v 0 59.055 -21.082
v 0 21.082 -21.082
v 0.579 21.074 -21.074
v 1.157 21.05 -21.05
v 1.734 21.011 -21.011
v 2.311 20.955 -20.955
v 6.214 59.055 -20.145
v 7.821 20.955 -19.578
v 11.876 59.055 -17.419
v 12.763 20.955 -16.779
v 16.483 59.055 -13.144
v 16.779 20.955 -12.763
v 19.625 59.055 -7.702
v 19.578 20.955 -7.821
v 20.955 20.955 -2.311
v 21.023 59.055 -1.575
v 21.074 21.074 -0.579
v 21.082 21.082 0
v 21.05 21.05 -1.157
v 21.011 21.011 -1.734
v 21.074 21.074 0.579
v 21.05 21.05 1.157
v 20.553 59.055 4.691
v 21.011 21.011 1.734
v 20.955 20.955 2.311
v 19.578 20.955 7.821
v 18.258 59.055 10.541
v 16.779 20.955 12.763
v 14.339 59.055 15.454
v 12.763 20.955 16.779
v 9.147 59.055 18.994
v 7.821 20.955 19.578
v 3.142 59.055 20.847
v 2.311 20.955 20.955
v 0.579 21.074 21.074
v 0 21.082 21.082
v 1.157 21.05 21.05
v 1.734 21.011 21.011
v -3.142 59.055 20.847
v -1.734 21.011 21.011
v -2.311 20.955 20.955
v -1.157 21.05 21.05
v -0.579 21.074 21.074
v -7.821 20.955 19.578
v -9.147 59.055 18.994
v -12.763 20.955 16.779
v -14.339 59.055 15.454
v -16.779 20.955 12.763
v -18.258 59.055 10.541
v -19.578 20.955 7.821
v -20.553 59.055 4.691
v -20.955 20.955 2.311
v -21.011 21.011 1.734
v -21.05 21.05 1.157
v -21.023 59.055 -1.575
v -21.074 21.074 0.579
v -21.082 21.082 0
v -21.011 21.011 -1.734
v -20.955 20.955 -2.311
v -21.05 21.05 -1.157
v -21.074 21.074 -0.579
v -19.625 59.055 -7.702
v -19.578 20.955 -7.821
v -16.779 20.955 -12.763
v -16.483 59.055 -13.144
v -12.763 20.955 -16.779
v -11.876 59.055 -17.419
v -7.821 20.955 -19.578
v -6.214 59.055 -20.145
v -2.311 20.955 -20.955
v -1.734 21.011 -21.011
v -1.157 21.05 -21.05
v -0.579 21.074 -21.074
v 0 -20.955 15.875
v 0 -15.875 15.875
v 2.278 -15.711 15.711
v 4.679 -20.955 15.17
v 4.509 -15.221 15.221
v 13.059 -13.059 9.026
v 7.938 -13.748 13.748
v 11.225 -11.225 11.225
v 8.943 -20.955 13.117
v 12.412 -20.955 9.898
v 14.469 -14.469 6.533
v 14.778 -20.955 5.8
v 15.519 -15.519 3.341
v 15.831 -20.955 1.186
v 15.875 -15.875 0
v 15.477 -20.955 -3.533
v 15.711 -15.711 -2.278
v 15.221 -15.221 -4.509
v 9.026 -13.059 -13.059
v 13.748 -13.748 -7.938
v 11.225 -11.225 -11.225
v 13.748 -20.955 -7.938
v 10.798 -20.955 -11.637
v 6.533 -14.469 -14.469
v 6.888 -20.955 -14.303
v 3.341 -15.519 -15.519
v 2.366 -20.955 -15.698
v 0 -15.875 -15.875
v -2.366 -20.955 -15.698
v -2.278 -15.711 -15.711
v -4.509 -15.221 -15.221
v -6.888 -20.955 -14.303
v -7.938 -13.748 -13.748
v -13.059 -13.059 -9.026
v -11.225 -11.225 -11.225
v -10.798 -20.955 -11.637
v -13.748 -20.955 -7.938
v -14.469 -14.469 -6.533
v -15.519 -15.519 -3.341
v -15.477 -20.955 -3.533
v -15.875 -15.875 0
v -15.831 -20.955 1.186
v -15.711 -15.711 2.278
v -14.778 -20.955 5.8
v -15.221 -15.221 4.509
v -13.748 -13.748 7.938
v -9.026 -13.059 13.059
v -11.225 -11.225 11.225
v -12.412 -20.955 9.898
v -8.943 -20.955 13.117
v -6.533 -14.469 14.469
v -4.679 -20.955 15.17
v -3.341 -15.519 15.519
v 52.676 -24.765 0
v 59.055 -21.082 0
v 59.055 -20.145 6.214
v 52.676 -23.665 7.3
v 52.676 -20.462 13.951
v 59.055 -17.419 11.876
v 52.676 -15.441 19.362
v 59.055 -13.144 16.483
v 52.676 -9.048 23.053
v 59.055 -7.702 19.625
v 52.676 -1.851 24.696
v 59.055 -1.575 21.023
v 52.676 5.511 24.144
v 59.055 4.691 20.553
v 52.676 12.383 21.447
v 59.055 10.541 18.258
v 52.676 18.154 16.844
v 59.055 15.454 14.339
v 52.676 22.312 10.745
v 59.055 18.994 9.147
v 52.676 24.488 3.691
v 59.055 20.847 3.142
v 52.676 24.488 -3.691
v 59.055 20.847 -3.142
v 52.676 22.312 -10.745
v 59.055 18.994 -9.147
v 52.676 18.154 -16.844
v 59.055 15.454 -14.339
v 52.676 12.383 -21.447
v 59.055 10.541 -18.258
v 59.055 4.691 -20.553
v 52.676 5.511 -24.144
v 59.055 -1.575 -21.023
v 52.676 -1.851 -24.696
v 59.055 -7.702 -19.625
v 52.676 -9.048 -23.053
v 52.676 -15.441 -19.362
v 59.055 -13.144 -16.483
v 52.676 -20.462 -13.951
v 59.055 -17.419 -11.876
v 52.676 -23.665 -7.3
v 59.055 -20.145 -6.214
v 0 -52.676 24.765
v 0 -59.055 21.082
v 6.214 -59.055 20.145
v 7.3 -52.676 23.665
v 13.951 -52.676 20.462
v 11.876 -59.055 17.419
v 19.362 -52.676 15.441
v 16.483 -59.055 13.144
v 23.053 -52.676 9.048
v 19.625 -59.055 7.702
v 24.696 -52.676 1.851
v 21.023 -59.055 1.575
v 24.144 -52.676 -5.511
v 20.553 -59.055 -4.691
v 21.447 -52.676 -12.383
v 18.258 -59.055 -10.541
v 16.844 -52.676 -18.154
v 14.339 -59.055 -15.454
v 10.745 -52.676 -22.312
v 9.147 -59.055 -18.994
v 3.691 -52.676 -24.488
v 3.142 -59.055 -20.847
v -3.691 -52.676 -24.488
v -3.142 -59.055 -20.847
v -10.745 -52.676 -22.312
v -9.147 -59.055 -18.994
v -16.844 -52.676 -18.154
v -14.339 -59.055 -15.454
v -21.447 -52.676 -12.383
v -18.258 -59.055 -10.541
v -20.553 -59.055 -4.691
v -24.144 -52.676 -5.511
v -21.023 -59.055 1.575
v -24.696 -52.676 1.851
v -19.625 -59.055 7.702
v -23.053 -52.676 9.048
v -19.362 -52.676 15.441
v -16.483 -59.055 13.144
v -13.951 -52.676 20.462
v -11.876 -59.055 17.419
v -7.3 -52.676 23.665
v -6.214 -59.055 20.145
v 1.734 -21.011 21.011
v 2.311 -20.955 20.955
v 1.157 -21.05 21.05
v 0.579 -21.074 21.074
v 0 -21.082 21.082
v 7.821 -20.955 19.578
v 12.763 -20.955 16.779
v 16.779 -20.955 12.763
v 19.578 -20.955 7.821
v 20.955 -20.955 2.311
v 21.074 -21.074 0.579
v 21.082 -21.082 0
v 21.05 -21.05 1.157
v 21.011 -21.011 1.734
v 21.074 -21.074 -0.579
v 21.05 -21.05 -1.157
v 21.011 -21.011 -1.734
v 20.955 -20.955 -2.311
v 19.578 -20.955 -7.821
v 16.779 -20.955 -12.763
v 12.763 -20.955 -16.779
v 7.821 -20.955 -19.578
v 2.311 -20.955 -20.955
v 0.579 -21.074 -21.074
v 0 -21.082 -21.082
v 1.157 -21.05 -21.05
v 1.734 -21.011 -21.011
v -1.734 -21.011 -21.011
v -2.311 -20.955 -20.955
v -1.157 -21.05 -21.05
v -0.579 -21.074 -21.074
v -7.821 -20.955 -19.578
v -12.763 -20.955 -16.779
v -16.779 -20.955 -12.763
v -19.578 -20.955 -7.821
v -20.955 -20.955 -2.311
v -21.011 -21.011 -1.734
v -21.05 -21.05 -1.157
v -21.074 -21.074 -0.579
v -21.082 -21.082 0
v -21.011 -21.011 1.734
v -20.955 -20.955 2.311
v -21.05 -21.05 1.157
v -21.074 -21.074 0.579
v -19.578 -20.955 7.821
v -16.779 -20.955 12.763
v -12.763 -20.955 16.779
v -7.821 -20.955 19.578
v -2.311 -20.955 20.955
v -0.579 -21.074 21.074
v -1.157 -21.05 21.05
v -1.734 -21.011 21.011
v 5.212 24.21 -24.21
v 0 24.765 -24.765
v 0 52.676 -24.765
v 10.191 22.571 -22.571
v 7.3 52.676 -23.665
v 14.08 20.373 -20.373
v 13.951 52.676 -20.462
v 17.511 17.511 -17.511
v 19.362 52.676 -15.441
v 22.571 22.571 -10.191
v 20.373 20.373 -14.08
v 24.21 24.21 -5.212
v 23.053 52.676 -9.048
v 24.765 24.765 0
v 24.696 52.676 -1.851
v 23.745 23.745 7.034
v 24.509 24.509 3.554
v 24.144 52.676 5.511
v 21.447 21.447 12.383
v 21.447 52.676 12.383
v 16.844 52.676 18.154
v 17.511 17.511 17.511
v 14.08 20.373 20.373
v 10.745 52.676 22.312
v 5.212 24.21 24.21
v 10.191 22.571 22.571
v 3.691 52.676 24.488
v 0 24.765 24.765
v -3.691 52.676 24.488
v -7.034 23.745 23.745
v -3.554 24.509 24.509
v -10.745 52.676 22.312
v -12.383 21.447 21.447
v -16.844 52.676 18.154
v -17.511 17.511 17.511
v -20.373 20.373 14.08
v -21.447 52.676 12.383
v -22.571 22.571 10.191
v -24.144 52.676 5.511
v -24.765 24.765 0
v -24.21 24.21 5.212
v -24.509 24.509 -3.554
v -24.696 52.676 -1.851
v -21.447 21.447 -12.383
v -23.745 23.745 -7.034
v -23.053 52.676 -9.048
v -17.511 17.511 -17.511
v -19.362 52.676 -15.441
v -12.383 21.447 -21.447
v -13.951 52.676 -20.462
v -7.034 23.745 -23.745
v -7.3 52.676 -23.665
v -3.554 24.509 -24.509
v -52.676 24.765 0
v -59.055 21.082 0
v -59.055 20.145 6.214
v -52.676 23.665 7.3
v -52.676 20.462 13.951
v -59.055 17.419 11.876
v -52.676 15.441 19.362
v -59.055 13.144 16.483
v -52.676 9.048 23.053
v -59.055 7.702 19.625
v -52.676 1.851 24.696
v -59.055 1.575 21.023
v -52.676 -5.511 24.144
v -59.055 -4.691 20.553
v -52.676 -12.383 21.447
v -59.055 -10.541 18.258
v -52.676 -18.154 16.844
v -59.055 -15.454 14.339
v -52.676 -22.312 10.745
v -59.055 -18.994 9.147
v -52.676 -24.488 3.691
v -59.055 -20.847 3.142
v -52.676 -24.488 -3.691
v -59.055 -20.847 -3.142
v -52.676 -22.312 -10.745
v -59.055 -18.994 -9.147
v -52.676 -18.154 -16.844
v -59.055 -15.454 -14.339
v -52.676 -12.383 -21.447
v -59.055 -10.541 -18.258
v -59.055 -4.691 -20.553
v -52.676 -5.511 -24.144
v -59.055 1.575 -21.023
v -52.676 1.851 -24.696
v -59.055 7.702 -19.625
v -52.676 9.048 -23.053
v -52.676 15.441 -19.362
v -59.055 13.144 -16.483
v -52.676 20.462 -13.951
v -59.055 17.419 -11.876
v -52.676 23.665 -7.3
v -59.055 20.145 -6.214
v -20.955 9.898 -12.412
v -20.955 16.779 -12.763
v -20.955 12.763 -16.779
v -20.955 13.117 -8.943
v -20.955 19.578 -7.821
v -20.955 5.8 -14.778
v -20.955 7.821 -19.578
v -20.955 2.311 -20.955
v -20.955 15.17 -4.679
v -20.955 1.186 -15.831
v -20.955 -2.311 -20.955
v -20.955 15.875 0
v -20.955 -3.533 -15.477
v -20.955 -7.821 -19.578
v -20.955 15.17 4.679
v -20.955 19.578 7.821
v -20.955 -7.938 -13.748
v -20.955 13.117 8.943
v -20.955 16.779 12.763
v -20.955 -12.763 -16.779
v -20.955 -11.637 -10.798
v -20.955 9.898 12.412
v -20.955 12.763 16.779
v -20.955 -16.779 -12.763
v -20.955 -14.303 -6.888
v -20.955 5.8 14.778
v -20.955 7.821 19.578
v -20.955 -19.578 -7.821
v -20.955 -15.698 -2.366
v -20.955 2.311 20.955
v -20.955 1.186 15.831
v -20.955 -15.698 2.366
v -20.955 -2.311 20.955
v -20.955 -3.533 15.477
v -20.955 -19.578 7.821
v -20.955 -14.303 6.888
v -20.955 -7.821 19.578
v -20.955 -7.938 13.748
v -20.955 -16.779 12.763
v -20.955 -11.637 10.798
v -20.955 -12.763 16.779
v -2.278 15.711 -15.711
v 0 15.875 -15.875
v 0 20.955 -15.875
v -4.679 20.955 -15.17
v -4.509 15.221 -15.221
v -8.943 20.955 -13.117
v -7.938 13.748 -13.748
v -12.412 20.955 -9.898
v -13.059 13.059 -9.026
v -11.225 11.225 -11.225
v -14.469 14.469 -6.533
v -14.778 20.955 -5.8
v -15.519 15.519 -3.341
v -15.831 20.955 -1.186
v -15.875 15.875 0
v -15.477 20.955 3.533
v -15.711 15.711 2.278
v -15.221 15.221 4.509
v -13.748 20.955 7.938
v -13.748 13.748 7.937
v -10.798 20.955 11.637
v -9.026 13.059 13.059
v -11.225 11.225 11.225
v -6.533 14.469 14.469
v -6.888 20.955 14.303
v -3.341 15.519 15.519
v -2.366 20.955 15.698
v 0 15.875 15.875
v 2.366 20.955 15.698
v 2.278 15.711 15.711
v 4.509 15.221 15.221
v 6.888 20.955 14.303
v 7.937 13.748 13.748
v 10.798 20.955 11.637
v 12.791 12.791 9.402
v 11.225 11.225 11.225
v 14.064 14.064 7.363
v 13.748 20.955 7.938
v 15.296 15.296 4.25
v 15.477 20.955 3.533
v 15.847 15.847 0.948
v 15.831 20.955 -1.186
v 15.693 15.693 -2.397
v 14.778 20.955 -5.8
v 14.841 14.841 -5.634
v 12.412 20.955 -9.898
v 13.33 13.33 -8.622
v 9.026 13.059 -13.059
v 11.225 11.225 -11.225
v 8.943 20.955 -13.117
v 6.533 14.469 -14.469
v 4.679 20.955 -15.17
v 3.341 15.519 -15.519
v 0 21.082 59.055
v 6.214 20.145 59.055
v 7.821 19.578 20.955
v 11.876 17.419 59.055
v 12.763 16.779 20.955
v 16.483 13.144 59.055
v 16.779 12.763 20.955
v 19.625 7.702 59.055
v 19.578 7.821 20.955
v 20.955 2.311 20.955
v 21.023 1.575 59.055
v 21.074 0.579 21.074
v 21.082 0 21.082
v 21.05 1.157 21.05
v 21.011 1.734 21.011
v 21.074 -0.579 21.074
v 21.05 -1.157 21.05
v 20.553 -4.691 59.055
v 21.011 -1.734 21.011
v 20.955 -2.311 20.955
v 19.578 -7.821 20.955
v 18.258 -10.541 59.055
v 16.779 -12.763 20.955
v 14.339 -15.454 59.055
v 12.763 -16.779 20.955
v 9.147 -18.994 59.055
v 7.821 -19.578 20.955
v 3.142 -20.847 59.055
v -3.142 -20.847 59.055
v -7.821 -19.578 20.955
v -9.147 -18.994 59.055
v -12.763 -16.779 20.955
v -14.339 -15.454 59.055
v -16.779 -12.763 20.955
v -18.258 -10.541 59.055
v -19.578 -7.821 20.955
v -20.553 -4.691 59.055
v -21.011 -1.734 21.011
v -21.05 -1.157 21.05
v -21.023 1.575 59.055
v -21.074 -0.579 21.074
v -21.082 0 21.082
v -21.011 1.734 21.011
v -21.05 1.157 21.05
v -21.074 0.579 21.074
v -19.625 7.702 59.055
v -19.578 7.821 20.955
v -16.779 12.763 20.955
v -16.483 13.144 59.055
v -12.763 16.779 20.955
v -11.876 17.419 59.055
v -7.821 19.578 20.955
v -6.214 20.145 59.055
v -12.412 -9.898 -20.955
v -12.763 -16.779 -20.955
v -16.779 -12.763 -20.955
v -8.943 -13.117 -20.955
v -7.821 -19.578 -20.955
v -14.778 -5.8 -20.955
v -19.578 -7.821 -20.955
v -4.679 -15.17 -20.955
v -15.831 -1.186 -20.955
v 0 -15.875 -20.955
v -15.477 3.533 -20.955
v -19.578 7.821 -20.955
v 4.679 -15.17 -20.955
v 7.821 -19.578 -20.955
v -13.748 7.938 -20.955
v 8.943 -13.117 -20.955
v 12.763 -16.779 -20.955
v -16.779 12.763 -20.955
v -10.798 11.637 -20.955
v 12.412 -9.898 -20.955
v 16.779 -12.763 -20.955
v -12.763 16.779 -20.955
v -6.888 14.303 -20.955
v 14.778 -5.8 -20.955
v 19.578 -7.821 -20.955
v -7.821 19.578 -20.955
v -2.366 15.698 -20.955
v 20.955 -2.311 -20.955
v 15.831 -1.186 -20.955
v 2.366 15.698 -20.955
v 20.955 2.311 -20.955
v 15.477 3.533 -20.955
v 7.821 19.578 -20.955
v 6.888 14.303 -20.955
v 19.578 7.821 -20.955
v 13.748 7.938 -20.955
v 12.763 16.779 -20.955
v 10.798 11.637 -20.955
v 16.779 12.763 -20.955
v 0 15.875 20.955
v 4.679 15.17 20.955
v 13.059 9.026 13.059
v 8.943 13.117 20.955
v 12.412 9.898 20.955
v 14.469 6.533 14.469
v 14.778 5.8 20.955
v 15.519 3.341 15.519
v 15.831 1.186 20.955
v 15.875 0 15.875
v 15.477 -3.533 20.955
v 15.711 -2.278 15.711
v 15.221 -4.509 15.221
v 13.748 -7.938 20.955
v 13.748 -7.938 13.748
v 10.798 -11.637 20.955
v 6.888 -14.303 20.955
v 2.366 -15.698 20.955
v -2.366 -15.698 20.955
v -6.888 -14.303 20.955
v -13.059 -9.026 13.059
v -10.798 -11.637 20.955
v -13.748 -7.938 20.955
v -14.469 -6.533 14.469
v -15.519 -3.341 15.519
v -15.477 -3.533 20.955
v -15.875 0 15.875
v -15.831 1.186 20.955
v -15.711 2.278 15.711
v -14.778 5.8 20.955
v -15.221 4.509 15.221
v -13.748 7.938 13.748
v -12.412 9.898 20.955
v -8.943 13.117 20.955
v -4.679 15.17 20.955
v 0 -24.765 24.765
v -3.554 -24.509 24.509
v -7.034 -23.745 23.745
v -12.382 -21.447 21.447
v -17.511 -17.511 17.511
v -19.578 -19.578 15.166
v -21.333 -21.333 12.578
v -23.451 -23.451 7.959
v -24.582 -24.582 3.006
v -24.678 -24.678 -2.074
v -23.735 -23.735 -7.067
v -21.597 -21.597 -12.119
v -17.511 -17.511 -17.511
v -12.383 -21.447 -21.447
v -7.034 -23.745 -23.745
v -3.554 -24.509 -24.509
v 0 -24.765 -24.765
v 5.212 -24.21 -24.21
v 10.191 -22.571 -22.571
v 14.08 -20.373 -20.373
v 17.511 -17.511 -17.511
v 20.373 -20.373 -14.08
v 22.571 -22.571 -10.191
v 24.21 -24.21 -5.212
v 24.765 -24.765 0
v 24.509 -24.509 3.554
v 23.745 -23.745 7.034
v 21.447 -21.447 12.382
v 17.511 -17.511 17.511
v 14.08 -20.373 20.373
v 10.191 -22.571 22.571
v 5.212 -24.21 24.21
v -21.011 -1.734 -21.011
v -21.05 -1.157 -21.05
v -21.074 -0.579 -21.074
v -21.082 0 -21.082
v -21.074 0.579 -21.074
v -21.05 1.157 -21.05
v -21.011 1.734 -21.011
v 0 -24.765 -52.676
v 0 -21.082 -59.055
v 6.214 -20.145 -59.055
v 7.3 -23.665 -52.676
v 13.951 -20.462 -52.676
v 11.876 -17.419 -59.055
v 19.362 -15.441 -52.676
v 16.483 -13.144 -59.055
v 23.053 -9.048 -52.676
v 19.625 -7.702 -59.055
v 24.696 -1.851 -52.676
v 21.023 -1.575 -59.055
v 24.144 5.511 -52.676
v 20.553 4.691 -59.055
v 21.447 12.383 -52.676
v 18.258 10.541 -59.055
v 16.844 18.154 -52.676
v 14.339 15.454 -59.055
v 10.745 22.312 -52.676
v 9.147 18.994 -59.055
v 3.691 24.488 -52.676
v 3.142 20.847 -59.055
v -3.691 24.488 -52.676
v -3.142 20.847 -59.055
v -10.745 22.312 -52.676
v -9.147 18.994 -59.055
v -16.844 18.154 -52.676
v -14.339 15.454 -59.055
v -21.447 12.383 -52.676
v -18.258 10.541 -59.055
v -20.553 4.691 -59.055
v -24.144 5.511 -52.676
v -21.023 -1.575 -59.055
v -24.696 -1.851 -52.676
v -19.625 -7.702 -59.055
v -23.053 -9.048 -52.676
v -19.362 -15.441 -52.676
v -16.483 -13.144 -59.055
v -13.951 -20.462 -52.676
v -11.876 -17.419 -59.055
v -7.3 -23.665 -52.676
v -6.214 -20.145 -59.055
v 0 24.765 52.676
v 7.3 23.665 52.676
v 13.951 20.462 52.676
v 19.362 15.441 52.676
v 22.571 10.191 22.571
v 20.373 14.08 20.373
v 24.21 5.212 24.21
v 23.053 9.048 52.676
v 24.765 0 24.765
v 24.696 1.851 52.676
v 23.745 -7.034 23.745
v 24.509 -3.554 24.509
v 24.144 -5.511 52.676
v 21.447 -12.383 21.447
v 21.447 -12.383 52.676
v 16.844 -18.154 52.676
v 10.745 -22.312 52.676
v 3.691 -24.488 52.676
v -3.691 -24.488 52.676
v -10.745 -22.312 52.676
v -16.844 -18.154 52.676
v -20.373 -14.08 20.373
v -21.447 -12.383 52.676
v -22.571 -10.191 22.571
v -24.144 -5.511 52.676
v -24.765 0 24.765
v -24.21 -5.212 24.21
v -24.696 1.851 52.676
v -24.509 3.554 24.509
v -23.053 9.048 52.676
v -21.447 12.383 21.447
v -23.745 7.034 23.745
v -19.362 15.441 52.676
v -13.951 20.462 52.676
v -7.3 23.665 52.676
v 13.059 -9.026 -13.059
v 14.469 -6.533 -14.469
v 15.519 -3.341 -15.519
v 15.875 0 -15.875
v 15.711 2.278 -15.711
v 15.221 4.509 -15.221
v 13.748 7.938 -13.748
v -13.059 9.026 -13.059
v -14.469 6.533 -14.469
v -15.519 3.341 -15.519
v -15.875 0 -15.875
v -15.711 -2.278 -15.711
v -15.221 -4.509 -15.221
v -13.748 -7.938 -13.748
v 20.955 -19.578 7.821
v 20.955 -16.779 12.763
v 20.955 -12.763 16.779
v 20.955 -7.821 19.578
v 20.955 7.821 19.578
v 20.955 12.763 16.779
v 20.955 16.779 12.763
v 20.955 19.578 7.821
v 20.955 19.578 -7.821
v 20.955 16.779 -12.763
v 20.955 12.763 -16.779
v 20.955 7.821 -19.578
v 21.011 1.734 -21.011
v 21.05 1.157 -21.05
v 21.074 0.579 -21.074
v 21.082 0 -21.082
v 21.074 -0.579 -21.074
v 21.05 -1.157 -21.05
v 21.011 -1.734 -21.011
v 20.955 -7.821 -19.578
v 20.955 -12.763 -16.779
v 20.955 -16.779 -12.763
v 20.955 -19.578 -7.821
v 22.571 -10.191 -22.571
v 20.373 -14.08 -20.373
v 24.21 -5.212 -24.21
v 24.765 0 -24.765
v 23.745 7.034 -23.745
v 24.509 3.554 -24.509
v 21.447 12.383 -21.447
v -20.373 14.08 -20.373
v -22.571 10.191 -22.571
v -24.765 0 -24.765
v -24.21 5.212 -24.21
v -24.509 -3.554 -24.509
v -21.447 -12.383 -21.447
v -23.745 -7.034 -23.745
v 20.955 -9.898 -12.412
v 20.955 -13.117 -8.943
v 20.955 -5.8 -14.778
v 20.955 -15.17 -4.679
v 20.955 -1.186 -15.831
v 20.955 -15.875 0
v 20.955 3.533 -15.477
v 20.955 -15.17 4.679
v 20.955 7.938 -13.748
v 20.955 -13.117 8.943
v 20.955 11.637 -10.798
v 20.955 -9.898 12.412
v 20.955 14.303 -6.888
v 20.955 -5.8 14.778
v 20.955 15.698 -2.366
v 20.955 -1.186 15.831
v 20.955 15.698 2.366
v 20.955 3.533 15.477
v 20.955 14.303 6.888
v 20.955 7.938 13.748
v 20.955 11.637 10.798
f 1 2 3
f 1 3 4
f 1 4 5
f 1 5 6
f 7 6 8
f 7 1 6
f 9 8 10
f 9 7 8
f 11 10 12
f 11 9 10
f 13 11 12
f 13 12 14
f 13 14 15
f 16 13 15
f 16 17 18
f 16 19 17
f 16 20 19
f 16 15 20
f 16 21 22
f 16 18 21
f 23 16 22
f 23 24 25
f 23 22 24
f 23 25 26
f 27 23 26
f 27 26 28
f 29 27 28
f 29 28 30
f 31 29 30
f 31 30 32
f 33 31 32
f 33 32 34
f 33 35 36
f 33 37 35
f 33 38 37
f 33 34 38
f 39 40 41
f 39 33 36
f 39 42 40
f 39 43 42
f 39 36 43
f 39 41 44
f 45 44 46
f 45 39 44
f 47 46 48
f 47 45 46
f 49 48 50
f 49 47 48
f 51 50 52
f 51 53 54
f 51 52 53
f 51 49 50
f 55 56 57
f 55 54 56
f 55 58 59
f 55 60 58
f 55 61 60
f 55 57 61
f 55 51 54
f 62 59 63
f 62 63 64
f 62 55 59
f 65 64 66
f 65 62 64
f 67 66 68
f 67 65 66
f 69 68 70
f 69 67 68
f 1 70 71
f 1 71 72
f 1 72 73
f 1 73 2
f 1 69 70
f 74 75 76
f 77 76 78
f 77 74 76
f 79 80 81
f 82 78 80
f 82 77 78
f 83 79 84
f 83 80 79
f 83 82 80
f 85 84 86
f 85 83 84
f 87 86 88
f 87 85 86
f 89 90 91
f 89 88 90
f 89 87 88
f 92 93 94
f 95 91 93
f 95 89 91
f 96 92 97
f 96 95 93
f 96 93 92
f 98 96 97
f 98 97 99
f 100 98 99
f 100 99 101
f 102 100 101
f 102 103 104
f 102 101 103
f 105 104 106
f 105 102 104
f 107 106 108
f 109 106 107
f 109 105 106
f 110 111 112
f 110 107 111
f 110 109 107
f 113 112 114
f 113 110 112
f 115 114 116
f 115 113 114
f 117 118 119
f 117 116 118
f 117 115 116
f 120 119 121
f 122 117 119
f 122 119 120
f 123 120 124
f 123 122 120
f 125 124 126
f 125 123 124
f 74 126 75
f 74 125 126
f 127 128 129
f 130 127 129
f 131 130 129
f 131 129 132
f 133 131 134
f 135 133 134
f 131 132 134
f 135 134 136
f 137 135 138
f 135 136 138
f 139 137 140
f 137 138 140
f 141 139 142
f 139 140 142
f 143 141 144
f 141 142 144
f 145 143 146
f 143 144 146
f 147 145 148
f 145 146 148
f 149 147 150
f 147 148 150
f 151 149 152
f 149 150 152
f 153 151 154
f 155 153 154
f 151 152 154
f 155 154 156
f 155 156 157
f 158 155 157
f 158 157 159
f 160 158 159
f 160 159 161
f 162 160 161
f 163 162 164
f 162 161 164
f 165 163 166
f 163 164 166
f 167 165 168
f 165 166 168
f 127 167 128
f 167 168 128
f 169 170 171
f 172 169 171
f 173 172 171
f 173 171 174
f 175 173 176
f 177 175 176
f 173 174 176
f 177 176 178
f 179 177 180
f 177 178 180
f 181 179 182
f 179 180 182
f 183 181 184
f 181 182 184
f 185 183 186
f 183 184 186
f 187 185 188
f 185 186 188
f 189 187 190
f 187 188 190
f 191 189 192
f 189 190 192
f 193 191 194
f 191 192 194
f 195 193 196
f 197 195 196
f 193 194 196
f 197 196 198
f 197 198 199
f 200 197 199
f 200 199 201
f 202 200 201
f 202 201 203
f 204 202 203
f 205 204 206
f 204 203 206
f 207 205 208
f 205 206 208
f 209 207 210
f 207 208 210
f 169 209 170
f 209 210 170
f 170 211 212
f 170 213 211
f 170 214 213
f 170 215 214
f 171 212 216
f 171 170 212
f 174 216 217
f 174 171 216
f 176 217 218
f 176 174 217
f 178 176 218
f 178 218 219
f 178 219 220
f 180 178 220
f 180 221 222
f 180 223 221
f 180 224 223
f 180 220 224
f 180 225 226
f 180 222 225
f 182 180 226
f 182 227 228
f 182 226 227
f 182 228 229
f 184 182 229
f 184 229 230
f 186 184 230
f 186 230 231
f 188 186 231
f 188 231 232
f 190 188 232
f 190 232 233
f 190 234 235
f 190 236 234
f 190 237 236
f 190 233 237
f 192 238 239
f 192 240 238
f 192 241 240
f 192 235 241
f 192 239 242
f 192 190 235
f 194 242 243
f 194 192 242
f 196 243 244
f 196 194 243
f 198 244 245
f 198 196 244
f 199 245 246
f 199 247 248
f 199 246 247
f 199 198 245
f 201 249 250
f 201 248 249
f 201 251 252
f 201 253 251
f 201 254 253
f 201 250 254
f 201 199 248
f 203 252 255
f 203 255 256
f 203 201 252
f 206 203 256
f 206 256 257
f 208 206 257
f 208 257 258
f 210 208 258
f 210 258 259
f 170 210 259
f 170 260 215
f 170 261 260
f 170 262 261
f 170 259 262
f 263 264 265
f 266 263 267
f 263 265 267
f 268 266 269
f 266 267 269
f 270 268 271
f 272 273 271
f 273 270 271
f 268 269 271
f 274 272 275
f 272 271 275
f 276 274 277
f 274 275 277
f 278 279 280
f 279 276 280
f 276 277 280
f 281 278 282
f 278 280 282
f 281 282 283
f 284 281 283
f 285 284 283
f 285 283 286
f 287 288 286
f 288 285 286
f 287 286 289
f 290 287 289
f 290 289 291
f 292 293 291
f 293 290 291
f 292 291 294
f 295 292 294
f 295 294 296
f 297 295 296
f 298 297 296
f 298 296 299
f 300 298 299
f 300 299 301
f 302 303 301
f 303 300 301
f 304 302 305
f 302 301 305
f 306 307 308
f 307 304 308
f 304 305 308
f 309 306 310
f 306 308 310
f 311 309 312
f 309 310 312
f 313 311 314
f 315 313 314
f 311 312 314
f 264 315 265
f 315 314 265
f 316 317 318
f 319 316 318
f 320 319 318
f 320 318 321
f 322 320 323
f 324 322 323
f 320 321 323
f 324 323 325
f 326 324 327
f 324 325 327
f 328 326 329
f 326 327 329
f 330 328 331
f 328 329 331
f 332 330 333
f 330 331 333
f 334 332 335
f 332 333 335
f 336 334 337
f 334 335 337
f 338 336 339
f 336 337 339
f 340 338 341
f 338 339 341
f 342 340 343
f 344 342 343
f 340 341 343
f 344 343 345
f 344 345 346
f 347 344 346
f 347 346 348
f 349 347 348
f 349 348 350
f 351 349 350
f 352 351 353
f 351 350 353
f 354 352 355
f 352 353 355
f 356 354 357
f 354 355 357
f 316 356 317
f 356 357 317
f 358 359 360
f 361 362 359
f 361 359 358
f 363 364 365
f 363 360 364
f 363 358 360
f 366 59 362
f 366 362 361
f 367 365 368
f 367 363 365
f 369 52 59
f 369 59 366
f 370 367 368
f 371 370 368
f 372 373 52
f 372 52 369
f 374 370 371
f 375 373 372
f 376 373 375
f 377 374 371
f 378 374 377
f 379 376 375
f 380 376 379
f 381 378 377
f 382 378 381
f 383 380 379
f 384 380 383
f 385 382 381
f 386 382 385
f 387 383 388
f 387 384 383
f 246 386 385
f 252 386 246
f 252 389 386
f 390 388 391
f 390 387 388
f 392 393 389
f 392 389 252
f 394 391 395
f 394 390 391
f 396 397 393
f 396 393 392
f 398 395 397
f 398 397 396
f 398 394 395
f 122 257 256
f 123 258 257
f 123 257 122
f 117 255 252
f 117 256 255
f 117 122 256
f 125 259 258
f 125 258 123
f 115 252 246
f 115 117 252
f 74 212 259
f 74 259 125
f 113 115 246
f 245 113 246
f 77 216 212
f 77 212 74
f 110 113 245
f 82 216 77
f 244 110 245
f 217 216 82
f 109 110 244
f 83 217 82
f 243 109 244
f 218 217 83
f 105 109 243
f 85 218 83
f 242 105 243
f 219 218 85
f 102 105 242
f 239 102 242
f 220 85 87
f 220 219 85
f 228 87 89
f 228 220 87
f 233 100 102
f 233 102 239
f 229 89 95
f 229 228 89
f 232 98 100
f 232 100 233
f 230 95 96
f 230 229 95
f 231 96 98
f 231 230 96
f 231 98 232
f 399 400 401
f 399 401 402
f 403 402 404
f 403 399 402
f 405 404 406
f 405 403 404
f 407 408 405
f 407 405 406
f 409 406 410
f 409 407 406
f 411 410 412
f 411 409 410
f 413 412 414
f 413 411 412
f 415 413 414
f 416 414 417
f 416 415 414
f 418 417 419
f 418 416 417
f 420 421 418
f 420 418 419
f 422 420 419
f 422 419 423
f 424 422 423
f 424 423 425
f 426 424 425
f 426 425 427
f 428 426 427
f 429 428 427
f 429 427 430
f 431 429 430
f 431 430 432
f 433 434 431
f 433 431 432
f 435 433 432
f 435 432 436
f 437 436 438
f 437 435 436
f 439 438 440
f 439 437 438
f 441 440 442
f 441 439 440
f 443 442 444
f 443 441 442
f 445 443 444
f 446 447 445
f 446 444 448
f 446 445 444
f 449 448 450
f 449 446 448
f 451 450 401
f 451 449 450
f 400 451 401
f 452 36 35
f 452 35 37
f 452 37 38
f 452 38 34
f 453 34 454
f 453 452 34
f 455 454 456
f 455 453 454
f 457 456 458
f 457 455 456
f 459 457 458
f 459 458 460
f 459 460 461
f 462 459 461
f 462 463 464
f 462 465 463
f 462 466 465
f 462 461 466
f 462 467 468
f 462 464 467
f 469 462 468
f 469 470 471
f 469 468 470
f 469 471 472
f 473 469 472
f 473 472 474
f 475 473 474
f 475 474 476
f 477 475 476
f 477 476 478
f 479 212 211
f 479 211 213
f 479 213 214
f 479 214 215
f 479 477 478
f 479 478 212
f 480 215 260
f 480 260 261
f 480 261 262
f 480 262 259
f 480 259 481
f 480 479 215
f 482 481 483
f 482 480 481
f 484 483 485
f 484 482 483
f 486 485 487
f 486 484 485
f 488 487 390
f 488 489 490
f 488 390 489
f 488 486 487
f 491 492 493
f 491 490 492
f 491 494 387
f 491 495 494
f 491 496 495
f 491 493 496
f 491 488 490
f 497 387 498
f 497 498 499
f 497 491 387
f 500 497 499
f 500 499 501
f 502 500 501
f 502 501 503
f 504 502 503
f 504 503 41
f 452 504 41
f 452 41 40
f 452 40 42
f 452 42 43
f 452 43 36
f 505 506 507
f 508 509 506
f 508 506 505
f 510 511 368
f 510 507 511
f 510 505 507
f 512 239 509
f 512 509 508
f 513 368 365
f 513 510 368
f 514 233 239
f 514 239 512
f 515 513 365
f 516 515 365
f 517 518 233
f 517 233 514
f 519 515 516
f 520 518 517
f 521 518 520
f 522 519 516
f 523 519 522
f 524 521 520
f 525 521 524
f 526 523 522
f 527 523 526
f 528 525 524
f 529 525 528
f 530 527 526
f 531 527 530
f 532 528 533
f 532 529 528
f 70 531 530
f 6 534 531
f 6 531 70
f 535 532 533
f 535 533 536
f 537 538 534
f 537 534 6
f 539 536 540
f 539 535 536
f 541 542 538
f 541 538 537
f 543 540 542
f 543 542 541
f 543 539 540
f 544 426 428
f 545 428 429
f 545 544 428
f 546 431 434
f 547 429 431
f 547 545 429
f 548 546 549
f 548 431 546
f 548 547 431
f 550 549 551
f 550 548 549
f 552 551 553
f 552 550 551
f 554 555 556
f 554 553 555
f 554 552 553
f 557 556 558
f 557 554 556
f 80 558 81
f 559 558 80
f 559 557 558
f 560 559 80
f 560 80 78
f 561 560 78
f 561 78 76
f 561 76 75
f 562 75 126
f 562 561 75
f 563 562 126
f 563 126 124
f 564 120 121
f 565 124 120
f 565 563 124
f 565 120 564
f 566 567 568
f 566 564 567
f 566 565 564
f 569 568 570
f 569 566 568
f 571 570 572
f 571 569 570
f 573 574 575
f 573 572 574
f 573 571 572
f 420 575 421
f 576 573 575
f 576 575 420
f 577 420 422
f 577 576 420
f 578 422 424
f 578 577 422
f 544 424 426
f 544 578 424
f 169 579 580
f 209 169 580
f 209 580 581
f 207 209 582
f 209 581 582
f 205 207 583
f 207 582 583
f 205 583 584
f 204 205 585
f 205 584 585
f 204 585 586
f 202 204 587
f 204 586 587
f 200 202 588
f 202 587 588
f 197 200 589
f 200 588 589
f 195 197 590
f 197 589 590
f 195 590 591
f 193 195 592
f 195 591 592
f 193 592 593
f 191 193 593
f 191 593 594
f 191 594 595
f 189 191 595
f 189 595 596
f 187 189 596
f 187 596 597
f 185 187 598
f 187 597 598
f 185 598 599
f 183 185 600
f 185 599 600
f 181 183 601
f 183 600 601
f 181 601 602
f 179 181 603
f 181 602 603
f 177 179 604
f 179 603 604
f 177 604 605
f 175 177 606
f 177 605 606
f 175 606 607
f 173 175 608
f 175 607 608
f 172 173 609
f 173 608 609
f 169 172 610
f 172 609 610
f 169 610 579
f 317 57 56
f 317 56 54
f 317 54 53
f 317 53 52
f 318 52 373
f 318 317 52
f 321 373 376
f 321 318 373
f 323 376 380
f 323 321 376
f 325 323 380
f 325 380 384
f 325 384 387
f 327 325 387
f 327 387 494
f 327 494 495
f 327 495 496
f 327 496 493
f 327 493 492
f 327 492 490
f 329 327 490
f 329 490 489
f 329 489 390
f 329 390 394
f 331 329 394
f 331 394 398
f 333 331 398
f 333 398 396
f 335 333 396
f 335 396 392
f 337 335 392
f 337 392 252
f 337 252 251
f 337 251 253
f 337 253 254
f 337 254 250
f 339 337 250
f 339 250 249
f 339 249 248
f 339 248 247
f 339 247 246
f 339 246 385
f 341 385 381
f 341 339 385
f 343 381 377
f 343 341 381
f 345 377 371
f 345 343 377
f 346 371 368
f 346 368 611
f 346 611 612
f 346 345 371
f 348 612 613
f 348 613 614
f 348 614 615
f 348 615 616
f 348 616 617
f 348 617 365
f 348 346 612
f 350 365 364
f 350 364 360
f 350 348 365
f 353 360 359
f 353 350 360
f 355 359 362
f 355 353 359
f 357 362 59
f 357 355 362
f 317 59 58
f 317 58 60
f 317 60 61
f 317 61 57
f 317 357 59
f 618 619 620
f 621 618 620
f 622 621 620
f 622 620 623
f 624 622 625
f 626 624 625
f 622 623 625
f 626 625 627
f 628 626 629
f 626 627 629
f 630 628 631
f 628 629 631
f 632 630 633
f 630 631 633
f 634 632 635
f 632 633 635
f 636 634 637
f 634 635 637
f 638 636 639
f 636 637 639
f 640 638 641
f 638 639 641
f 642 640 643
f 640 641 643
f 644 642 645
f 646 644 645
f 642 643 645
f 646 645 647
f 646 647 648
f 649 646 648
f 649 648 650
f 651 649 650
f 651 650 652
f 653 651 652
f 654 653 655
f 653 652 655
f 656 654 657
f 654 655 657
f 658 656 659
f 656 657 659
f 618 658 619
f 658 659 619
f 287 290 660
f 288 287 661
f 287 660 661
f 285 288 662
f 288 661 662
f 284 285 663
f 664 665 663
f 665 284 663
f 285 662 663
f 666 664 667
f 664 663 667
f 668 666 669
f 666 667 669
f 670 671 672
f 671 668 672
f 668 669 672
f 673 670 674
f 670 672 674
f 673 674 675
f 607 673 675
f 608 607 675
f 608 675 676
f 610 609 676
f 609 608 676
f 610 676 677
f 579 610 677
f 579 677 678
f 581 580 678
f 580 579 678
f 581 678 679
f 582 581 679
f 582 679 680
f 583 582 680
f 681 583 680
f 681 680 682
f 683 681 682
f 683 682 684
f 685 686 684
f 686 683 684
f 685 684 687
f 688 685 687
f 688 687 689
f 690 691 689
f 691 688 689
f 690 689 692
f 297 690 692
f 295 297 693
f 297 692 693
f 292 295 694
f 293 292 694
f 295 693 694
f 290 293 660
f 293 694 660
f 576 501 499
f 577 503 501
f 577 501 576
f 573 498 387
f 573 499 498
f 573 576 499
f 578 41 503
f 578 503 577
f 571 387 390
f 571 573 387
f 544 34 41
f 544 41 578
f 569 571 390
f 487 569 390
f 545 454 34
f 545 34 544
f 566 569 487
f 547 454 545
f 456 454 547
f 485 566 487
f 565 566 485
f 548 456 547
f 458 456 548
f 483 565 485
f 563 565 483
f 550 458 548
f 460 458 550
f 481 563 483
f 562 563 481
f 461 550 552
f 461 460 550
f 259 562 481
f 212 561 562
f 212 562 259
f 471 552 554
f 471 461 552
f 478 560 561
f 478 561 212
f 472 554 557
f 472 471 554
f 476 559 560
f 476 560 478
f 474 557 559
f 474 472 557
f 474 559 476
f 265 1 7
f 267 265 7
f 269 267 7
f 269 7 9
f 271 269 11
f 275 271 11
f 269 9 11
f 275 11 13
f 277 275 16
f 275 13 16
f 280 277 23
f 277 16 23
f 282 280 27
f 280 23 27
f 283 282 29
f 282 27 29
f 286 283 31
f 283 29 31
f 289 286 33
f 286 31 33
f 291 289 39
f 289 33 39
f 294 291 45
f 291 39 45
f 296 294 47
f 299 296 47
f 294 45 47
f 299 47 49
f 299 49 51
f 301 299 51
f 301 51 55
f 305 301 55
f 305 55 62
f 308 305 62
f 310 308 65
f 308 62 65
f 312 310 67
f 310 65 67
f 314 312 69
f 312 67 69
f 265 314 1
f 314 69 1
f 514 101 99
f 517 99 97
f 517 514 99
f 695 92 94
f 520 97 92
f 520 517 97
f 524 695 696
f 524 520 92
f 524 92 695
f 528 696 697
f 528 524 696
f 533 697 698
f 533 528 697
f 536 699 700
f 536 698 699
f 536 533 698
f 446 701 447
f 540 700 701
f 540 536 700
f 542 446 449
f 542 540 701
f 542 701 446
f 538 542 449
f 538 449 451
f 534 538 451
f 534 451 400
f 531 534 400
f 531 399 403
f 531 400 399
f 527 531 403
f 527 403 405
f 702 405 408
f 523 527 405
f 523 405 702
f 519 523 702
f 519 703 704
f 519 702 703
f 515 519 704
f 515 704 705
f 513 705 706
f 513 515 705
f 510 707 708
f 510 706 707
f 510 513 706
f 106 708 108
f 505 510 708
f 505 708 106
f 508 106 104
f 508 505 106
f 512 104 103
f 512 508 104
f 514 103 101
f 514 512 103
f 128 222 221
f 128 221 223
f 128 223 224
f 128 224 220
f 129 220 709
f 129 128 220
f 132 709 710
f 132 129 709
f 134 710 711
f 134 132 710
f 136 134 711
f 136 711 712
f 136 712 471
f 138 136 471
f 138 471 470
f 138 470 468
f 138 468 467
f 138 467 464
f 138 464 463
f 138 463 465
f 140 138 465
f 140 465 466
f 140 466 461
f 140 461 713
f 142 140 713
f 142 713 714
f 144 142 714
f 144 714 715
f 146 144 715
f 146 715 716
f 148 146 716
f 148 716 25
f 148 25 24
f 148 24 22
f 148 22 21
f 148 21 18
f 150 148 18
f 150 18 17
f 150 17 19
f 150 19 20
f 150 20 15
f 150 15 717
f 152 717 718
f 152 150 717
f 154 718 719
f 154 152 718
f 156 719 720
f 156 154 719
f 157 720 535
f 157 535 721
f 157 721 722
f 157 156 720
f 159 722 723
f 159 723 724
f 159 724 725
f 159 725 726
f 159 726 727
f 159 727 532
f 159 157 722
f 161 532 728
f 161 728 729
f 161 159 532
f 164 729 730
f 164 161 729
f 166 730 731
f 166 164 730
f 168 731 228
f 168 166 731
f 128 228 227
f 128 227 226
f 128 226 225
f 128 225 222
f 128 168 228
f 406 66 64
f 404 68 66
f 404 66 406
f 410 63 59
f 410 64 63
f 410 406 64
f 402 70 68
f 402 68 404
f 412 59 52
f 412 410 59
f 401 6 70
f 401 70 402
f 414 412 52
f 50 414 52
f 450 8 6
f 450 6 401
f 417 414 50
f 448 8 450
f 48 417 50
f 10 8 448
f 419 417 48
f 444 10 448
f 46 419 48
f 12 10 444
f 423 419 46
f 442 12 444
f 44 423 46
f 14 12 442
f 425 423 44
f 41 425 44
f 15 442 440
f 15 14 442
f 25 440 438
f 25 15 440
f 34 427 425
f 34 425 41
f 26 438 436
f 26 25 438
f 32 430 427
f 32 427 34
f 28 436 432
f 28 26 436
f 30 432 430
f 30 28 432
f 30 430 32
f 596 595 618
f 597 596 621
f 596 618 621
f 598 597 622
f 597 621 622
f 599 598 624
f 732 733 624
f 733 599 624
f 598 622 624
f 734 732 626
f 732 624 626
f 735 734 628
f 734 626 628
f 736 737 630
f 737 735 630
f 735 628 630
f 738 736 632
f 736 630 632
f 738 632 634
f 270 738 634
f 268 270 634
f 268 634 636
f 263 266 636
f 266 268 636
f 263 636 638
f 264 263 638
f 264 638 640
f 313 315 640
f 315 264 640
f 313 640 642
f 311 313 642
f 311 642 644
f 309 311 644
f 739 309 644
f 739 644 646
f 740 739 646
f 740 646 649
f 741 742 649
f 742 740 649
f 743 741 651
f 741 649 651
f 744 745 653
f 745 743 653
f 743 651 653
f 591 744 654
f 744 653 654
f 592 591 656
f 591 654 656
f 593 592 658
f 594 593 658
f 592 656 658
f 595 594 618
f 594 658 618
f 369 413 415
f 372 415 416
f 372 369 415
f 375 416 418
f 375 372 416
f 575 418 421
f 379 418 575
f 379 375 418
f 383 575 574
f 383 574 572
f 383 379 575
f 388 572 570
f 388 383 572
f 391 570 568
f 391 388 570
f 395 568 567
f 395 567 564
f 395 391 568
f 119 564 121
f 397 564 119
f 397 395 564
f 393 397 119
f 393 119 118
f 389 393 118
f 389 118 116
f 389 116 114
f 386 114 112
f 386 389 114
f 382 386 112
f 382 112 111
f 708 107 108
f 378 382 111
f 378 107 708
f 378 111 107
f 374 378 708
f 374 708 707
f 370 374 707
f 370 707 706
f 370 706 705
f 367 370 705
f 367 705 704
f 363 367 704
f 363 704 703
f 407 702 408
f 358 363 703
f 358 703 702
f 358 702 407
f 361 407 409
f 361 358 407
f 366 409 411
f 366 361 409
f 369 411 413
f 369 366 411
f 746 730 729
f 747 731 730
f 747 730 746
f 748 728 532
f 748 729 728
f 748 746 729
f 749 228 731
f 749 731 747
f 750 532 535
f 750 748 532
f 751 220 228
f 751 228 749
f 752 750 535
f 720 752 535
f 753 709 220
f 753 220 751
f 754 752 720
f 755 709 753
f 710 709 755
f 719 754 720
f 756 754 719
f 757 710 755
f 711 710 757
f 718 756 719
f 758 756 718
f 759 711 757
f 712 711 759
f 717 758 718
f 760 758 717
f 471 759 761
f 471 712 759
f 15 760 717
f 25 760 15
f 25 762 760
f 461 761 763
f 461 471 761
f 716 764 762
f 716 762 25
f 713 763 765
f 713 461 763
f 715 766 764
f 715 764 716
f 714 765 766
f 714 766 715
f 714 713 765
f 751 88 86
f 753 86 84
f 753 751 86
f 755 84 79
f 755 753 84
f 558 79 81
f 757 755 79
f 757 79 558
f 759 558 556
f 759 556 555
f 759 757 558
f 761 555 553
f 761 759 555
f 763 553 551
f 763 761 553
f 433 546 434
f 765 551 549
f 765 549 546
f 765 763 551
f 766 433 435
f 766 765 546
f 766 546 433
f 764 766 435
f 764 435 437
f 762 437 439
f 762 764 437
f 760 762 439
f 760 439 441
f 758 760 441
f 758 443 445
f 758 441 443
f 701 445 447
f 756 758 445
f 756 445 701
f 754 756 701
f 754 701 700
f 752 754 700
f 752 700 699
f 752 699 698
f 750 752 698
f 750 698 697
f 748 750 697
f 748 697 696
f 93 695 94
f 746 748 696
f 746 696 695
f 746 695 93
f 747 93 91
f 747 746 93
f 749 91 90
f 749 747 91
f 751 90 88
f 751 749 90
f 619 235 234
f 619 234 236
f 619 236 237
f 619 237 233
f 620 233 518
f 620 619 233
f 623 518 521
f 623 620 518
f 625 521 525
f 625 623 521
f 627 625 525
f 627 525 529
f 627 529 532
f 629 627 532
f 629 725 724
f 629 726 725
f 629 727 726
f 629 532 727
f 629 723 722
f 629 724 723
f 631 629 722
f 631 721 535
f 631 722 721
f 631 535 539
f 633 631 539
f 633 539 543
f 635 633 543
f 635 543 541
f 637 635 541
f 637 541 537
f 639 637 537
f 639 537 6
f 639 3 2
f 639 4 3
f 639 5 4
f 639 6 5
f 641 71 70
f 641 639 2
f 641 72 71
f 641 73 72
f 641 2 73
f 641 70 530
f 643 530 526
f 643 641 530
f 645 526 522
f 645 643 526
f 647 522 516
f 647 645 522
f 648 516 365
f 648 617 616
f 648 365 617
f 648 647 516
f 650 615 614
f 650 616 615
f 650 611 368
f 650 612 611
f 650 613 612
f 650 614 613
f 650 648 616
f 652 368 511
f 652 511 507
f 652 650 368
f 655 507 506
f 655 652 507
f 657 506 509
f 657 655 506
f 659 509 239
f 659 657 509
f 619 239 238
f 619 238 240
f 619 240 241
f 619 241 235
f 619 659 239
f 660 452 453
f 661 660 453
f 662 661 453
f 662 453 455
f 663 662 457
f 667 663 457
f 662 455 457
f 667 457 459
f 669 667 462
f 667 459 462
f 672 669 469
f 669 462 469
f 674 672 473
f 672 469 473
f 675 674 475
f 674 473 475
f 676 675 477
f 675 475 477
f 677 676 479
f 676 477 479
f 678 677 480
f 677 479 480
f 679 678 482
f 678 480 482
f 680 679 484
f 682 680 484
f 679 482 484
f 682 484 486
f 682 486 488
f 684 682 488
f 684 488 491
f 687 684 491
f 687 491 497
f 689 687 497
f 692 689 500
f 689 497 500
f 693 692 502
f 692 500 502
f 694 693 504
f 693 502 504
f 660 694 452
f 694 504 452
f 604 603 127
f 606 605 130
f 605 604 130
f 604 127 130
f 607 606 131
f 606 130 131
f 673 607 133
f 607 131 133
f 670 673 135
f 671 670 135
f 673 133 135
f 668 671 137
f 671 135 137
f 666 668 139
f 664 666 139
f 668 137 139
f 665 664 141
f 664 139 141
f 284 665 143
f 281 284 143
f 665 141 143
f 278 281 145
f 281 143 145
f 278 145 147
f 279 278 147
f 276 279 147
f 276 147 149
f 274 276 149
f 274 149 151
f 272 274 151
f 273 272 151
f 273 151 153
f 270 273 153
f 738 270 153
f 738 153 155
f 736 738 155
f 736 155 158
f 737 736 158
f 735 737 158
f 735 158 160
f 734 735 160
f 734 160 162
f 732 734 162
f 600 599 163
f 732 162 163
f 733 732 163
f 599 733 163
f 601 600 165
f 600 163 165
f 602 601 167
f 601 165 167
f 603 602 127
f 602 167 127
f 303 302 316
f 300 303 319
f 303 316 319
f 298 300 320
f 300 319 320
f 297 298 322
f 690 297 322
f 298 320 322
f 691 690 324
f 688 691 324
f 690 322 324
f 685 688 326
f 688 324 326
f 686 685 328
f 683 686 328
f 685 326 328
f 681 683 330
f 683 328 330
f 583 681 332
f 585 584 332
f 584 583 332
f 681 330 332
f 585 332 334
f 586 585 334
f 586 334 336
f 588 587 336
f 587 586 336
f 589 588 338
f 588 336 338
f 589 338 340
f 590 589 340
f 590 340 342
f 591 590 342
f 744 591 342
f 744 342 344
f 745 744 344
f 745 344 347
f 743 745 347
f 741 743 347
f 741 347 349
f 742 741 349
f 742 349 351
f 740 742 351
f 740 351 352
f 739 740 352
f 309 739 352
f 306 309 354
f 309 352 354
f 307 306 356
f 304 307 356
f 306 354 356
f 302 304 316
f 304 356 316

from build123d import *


with BuildPart() as f6:
    # F0 (on Right) → F6 (revolve)
    with BuildSketch(Plane.YZ):
        with BuildLine():
            Line((-52.6758568757, 24.765), (-59.055, 21.082))
            Line((-59.055, 21.082), (-20.955, 21.082))
            Line((-20.955, 21.082), (-20.955, 15.875))
            Line((-20.955, 15.875), (0, 15.875))
            ThreePointArc((0, 15.875), (11.2253201513, 11.2253201513), (15.875, 0))
            Line((15.875, 0), (24.765, 0))
            ThreePointArc((24.765, 0), (17.5114994361, 17.5114994361), (0, 24.765))
            Line((0, 24.765), (-52.6758568757, 24.765))
        make_face()
        with BuildLine():
            Line((-20.955, 21.082), (-59.055, 21.082))
            Line((-59.055, 21.082), (-59.055, 0))
            Line((-59.055, 0), (0, 0))
            Line((0, 0), (10.5189766587, 0))
            Line((10.5189766587, 0), (15.875, 0))
            ThreePointArc((15.875, 0), (11.2253201513, 11.2253201513), (0, 15.875))
            Line((0, 15.875), (-20.955, 15.875))
            Line((-20.955, 15.875), (-20.955, 21.082))
        make_face()
    revolve(axis=Axis((0, -21.59, 0), (0, 1, 0)))

    # F1 (on Right) → F7 (revolve)
    with BuildSketch(Plane.YZ):
        with BuildLine():
            Line((-24.765, -52.6758568757), (-21.082, -59.055))
            Line((-21.082, -59.055), (-21.082, -20.955))
            Line((-21.082, -20.955), (-15.875, -20.955))
            Line((-15.875, -20.955), (-15.875, 0))
            ThreePointArc((-15.875, 0), (-11.2253201513, 11.2253201513), (0, 15.875))
            Line((0, 15.875), (0, 24.765))
            ThreePointArc((0, 24.765), (-17.5114994361, 17.5114994361), (-24.765, 0))
            Line((-24.765, 0), (-24.765, -52.6758568757))
        make_face()
        with BuildLine():
            Line((-21.082, -20.955), (-21.082, -59.055))
            Line((-21.082, -59.055), (0, -59.055))
            Line((0, -59.055), (0, 0))
            Line((0, 0), (0, 15.875))
            ThreePointArc((0, 15.875), (-11.2253201513, 11.2253201513), (-15.875, 0))
            Line((-15.875, 0), (-15.875, -20.955))
            Line((-15.875, -20.955), (-21.082, -20.955))
        make_face()
    revolve(axis=Axis((0, 0, -21.59), (0, 0, 1)))

    # F2 (on Right) → F8 (revolve)
    with BuildSketch(Plane.YZ):
        with BuildLine():
            Line((52.6758568757, -24.765), (59.055, -21.082))
            Line((59.055, -21.082), (20.955, -21.082))
            Line((20.955, -21.082), (20.955, -15.875))
            Line((20.955, -15.875), (0, -15.875))
            ThreePointArc((0, -15.875), (-11.2253201513, -11.2253201513), (-15.875, 0))
            Line((-15.875, 0), (-24.765, 0))
            ThreePointArc((-24.765, 0), (-17.5114994361, -17.5114994361), (0, -24.765))
            Line((0, -24.765), (52.6758568757, -24.765))
        make_face()
        with BuildLine():
            Line((20.955, -21.082), (59.055, -21.082))
            Line((59.055, -21.082), (59.055, 0))
            Line((59.055, 0), (10.5189766587, 0))
            Line((10.5189766587, 0), (0, 0))
            Line((0, 0), (-15.875, 0))
            ThreePointArc((-15.875, 0), (-11.2253201513, -11.2253201513), (0, -15.875))
            Line((0, -15.875), (20.955, -15.875))
            Line((20.955, -15.875), (20.955, -21.082))
        make_face()
    revolve(axis=Axis((0, 21.59, 0), (0, -1, 0)))

    # F3 (on Right) → F9 (revolve)
    with BuildSketch(Plane.YZ):
        with BuildLine():
            Line((24.765, 52.6758568757), (21.082, 59.055))
            Line((21.082, 59.055), (21.082, 20.955))
            Line((21.082, 20.955), (15.875, 20.955))
            Line((15.875, 20.955), (15.875, 0))
            ThreePointArc((15.875, 0), (11.2253201513, -11.2253201513), (0, -15.875))
            Line((0, -15.875), (0, -24.765))
            ThreePointArc((0, -24.765), (17.5114994361, -17.5114994361), (24.765, 0))
            Line((24.765, 0), (24.765, 52.6758568757))
        make_face()
        with BuildLine():
            Line((21.082, 20.955), (21.082, 59.055))
            Line((21.082, 59.055), (0, 59.055))
            Line((0, 59.055), (0, 9.2996467855))
            Line((0, 9.2996467855), (0, 0))
            Line((0, 0), (0, -15.875))
            ThreePointArc((0, -15.875), (11.2253201513, -11.2253201513), (15.875, 0))
            Line((15.875, 0), (15.875, 20.955))
            Line((15.875, 20.955), (21.082, 20.955))
        make_face()
    revolve(axis=Axis((0, 0, 21.59), (0, 0, -1)))

    # F4 (on Top) → F10 (revolve)
    with BuildSketch(Plane.XY):
        with BuildLine():
            Line((-52.6758568757, 24.765), (-59.055, 21.082))
            Line((-59.055, 21.082), (-20.955, 21.082))
            Line((-20.955, 21.082), (-20.955, 15.875))
            Line((-20.955, 15.875), (0, 15.875))
            ThreePointArc((0, 15.875), (11.2253201513, 11.2253201513), (15.875, 0))
            Line((15.875, 0), (24.765, 0))
            ThreePointArc((24.765, 0), (17.5114994361, 17.5114994361), (0, 24.765))
            Line((0, 24.765), (-52.6758568757, 24.765))
        make_face()
        with BuildLine():
            Line((-20.955, 21.082), (-59.055, 21.082))
            Line((-59.055, 21.082), (-59.055, 0))
            Line((-59.055, 0), (-12.5608257832, 0))
            Line((-12.5608257832, 0), (0, 0))
            Line((0, 0), (15.875, 0))
            ThreePointArc((15.875, 0), (11.2253201513, 11.2253201513), (0, 15.875))
            Line((0, 15.875), (-20.955, 15.875))
            Line((-20.955, 15.875), (-20.955, 21.082))
        make_face()
    revolve(axis=Axis((-21.59, 0, 0), (1, 0, 0)))

    # F5 (on Top) → F11 (revolve)
    with BuildSketch(Plane.XY):
        with BuildLine():
            Line((52.6758568757, -24.765), (59.055, -21.082))
            Line((59.055, -21.082), (20.955, -21.082))
            Line((20.955, -21.082), (20.955, -15.875))
            Line((20.955, -15.875), (0, -15.875))
            ThreePointArc((0, -15.875), (-11.2253201513, -11.2253201513), (-15.875, 0))
            Line((-15.875, 0), (-24.765, 0))
            ThreePointArc((-24.765, 0), (-17.5114994361, -17.5114994361), (0, -24.765))
            Line((0, -24.765), (52.6758568757, -24.765))
        make_face()
        Polygon((20.955, -21.082), (59.055, -21.082), (59.055, 0), (30.3153488902, 0), (0, 0), (0, -15.875), (20.955, -15.875), align=None)
        with BuildLine():
            ThreePointArc((-15.875, 0), (-11.2253201513, -11.2253201513), (0, -15.875))
            Line((0, -15.875), (0, 0))
            Line((0, 0), (-15.875, 0))
        make_face()
    revolve(axis=Axis((21.59, 0, 0), (-1, 0, 0)))

    # F0 (on Right) → F12 (revolve, cut)
    with BuildSketch(Plane.YZ):
        with BuildLine():
            Line((-20.955, 21.082), (-59.055, 21.082))
            Line((-59.055, 21.082), (-59.055, 0))
            Line((-59.055, 0), (0, 0))
            Line((0, 0), (10.5189766587, 0))
            Line((10.5189766587, 0), (15.875, 0))
            ThreePointArc((15.875, 0), (11.2253201513, 11.2253201513), (0, 15.875))
            Line((0, 15.875), (-20.955, 15.875))
            Line((-20.955, 15.875), (-20.955, 21.082))
        make_face()
    revolve(axis=Axis((0, -21.59, 0), (0, 1, 0)), mode=Mode.SUBTRACT)

    # F1 (on Right) → F13 (revolve, cut)
    with BuildSketch(Plane.YZ):
        with BuildLine():
            Line((-21.082, -20.955), (-21.082, -59.055))
            Line((-21.082, -59.055), (0, -59.055))
            Line((0, -59.055), (0, 0))
            Line((0, 0), (0, 15.875))
            ThreePointArc((0, 15.875), (-11.2253201513, 11.2253201513), (-15.875, 0))
            Line((-15.875, 0), (-15.875, -20.955))
            Line((-15.875, -20.955), (-21.082, -20.955))
        make_face()
    revolve(axis=Axis((0, 0, -21.59), (0, 0, 1)), mode=Mode.SUBTRACT)

    # F2 (on Right) → F14 (revolve, cut)
    with BuildSketch(Plane.YZ):
        with BuildLine():
            Line((20.955, -21.082), (59.055, -21.082))
            Line((59.055, -21.082), (59.055, 0))
            Line((59.055, 0), (10.5189766587, 0))
            Line((10.5189766587, 0), (0, 0))
            Line((0, 0), (-15.875, 0))
            ThreePointArc((-15.875, 0), (-11.2253201513, -11.2253201513), (0, -15.875))
            Line((0, -15.875), (20.955, -15.875))
            Line((20.955, -15.875), (20.955, -21.082))
        make_face()
    revolve(axis=Axis((0, 21.59, 0), (0, -1, 0)), mode=Mode.SUBTRACT)

    # F3 (on Right) → F15 (revolve, cut)
    with BuildSketch(Plane.YZ):
        with BuildLine():
            Line((21.082, 20.955), (21.082, 59.055))
            Line((21.082, 59.055), (0, 59.055))
            Line((0, 59.055), (0, 9.2996467855))
            Line((0, 9.2996467855), (0, 0))
            Line((0, 0), (0, -15.875))
            ThreePointArc((0, -15.875), (11.2253201513, -11.2253201513), (15.875, 0))
            Line((15.875, 0), (15.875, 20.955))
            Line((15.875, 20.955), (21.082, 20.955))
        make_face()
    revolve(axis=Axis((0, 0, 21.59), (0, 0, -1)), mode=Mode.SUBTRACT)

    # F4 (on Top) → F16 (revolve, cut)
    with BuildSketch(Plane.XY):
        with BuildLine():
            Line((-20.955, 21.082), (-59.055, 21.082))
            Line((-59.055, 21.082), (-59.055, 0))
            Line((-59.055, 0), (-12.5608257832, 0))
            Line((-12.5608257832, 0), (0, 0))
            Line((0, 0), (15.875, 0))
            ThreePointArc((15.875, 0), (11.2253201513, 11.2253201513), (0, 15.875))
            Line((0, 15.875), (-20.955, 15.875))
            Line((-20.955, 15.875), (-20.955, 21.082))
        make_face()
    revolve(axis=Axis((-21.59, 0, 0), (1, 0, 0)), mode=Mode.SUBTRACT)

    # F5 (on Top) → F17 (revolve, cut)
    with BuildSketch(Plane.XY):
        Polygon((20.955, -21.082), (59.055, -21.082), (59.055, 0), (30.3153488902, 0), (0, 0), (0, -15.875), (20.955, -15.875), align=None)
    revolve(axis=Axis((21.59, 0, 0), (-1, 0, 0)), mode=Mode.SUBTRACT)


solid = f6.part
